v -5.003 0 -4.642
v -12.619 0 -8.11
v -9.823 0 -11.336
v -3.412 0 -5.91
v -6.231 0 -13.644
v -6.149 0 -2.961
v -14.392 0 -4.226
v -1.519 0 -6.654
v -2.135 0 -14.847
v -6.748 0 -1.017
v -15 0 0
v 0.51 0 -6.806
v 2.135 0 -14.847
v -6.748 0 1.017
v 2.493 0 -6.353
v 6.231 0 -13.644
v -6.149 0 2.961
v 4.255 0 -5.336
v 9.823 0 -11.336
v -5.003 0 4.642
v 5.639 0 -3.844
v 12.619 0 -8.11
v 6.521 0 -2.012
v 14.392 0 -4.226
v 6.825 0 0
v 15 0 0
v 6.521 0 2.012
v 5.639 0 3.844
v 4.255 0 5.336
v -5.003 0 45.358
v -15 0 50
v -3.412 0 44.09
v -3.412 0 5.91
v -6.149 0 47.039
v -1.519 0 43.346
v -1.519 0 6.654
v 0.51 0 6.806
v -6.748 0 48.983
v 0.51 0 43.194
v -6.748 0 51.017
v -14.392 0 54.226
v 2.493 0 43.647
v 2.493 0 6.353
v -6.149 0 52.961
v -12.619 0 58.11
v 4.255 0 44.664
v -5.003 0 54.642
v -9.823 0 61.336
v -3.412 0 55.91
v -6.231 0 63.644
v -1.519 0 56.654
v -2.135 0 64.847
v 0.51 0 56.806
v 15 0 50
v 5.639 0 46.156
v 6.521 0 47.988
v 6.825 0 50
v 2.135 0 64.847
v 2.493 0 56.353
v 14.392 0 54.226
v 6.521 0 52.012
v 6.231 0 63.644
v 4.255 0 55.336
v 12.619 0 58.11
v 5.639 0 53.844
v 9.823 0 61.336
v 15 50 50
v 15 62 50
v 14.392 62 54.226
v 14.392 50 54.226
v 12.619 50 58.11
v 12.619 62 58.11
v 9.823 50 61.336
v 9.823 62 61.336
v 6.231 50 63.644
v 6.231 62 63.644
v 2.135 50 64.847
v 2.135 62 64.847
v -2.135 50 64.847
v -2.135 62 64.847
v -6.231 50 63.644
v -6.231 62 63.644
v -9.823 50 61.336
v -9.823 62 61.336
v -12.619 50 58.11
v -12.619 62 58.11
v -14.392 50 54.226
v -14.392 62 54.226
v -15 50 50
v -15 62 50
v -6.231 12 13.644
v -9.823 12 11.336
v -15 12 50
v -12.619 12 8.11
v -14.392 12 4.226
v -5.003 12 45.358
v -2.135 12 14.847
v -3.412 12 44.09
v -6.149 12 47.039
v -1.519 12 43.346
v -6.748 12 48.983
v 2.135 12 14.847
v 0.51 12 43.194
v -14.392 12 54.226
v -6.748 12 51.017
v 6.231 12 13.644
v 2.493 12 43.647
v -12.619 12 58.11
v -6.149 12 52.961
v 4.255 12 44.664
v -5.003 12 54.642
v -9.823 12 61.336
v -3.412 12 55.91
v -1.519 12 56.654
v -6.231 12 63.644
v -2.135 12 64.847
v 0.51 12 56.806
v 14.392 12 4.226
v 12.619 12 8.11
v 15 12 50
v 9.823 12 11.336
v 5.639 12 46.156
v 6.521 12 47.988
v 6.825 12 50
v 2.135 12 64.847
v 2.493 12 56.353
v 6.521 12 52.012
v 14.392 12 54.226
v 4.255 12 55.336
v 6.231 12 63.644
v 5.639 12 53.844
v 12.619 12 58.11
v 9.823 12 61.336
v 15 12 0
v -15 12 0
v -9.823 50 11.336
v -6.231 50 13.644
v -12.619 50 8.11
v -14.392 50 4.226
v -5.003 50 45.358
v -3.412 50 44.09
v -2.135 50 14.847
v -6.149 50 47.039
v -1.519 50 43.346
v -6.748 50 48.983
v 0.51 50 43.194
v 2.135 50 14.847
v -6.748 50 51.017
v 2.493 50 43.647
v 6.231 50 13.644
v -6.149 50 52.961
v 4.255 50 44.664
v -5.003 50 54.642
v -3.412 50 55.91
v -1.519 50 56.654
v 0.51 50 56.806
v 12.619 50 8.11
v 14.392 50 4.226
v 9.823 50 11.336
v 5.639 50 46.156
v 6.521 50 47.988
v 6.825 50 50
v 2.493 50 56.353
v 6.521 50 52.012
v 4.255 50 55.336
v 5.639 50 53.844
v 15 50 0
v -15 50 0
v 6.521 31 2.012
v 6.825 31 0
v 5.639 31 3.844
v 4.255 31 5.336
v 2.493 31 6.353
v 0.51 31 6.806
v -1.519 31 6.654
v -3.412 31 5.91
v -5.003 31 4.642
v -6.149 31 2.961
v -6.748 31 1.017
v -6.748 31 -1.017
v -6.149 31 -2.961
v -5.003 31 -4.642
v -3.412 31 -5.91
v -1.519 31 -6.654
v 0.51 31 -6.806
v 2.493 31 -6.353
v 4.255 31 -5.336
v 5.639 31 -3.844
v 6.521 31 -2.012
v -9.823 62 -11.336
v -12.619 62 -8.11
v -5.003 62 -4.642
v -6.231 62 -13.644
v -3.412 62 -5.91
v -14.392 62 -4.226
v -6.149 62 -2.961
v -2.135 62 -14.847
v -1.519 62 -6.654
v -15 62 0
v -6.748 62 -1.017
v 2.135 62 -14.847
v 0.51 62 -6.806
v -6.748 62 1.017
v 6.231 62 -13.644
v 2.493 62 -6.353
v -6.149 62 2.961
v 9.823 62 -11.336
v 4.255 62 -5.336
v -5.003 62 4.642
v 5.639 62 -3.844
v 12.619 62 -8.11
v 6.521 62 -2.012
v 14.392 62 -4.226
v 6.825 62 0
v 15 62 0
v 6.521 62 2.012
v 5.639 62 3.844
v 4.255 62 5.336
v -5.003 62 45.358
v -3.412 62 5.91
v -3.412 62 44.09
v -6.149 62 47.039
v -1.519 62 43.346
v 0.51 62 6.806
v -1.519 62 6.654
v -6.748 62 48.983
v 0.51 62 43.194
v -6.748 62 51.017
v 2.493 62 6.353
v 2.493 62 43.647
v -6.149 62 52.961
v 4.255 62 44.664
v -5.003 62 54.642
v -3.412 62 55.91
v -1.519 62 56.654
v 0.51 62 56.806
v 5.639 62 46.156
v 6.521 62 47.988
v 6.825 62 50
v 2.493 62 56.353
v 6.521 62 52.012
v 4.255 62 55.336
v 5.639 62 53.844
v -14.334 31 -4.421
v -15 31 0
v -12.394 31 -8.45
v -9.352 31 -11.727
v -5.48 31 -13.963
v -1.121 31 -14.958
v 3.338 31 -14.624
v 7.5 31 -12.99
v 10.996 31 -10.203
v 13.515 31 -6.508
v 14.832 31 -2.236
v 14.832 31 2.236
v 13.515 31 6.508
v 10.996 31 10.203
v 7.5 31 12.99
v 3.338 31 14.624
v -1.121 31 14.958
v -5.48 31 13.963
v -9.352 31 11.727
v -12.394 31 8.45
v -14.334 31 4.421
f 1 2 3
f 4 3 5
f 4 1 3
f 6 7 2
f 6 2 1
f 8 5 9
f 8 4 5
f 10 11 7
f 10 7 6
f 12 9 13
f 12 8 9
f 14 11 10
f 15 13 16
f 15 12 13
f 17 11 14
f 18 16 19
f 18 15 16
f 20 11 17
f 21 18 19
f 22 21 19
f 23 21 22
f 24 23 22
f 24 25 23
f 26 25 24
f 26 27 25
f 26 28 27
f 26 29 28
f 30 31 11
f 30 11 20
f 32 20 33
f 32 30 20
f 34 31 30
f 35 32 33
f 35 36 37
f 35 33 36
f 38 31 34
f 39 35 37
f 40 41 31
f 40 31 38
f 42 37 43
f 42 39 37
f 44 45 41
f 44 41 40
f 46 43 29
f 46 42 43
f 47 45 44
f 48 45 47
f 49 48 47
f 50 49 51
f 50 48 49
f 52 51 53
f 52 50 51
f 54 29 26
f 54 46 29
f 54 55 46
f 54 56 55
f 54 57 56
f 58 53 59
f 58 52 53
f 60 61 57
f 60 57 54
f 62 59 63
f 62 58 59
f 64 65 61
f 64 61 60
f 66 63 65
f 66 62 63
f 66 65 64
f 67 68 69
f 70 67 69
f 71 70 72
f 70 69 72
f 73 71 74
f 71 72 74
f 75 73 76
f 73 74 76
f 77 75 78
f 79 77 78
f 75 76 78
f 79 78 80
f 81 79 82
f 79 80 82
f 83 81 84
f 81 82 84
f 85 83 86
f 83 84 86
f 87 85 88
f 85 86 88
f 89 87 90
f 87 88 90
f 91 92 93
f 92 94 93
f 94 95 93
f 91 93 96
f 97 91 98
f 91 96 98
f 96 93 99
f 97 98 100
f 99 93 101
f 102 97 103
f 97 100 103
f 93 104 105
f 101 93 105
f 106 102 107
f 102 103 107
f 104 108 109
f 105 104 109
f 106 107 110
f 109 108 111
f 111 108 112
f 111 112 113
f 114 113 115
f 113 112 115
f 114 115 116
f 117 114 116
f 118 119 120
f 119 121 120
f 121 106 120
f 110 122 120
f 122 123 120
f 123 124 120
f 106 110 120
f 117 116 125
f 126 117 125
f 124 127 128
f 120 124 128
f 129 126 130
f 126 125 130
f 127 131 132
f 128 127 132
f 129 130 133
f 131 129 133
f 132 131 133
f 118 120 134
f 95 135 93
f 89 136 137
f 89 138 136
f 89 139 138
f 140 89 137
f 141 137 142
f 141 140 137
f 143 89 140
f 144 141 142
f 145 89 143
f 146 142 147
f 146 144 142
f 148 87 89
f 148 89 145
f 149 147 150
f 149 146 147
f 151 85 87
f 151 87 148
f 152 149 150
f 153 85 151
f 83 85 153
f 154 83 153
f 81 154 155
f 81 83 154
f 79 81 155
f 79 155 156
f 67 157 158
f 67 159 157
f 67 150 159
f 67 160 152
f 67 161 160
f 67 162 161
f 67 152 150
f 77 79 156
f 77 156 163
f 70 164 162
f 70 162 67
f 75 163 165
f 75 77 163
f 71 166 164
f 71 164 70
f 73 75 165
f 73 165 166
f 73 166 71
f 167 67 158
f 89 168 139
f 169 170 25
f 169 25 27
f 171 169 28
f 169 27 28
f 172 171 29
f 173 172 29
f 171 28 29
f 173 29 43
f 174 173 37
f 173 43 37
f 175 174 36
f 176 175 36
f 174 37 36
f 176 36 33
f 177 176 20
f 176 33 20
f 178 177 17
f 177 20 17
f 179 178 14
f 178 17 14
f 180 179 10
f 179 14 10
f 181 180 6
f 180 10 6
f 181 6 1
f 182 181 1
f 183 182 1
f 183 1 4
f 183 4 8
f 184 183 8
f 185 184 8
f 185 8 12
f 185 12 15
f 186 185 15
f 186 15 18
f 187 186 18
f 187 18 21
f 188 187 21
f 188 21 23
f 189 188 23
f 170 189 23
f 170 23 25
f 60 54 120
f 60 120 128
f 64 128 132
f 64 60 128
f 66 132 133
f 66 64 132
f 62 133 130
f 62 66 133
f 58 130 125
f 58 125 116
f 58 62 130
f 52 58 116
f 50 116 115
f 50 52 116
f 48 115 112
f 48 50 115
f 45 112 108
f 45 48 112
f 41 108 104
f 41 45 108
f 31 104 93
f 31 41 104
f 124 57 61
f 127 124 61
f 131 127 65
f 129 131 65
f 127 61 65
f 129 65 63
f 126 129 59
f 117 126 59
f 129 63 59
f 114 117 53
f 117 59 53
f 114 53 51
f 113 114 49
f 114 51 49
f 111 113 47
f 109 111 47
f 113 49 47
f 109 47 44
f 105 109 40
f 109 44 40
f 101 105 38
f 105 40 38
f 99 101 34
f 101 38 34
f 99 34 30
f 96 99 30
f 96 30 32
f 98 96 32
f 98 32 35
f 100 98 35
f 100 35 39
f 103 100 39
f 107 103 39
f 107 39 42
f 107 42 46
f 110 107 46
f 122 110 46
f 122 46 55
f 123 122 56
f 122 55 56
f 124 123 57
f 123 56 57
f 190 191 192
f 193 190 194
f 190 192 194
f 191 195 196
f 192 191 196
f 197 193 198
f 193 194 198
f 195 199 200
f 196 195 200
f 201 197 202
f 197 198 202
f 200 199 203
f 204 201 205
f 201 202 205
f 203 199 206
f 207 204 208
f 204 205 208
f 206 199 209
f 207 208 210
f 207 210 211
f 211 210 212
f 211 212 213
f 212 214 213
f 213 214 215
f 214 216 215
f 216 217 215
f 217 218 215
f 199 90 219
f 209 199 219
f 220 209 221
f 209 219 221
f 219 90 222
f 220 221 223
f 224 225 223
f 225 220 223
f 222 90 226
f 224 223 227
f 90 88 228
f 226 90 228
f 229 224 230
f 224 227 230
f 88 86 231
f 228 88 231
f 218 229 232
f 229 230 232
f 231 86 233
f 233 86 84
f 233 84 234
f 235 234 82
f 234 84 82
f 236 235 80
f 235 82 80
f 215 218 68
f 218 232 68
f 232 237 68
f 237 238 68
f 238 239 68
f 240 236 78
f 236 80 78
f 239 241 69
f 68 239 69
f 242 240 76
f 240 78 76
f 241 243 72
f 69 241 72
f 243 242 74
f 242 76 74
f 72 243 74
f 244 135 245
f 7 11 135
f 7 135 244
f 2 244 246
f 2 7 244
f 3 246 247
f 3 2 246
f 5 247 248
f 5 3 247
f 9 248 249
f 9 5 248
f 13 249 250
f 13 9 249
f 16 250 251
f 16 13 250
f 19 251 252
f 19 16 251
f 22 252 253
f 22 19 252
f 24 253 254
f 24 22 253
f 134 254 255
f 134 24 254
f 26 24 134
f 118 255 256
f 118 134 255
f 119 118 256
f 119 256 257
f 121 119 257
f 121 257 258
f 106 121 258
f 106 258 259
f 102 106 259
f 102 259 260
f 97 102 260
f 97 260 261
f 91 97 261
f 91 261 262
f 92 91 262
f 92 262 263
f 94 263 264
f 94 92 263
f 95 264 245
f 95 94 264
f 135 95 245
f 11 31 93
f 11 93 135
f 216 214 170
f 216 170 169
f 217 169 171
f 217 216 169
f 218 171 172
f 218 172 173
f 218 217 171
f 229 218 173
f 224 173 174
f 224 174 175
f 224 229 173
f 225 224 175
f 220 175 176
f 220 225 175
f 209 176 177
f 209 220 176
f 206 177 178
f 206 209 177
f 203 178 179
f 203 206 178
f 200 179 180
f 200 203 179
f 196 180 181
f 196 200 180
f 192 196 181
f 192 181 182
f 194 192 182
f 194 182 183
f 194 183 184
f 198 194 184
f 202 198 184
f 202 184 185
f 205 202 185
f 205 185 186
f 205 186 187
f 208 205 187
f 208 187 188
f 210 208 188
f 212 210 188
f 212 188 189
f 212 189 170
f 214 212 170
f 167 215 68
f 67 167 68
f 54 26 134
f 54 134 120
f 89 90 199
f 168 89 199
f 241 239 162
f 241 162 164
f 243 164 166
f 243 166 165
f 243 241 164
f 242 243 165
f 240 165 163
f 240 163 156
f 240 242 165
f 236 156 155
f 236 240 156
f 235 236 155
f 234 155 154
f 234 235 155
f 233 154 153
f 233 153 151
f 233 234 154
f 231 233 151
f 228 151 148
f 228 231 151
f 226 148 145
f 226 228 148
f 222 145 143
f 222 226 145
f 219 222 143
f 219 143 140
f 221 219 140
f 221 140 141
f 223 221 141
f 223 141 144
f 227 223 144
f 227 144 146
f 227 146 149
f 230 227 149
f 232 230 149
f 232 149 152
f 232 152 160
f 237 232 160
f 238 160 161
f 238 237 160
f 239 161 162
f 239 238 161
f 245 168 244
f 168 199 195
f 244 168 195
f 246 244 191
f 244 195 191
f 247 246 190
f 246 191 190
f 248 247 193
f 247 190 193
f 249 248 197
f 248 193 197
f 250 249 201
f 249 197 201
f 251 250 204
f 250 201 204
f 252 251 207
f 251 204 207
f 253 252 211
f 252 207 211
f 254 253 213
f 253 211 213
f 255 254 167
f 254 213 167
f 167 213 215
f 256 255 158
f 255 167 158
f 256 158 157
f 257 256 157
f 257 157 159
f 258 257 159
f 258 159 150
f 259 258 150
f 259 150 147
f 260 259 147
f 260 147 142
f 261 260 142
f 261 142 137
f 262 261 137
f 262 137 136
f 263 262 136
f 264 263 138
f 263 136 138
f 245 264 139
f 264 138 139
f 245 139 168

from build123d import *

# Parameters (mm, degrees)
F0_R     = 6.824609
F1_DEPTH = 12
F2_DEPTH = 31


with BuildPart() as f1:
    # F0 (on Front) → F1 (new body)
    with BuildSketch(Plane.XZ):
        with BuildLine():
            ThreePointArc((15, 50), (0, 65), (-15, 50))
            Line((-15, 50), (-15, 0))
            ThreePointArc((-15, 0), (0, 15), (15, 0))
            Line((15, 0), (15, 50))
        make_face()
        with Locations((0, 50)):
            Circle(F0_R, mode=Mode.SUBTRACT)
        with BuildLine():
            ThreePointArc((15, 0), (0, 15), (-15, 0))
            ThreePointArc((-15, 0), (0, -15), (15, 0))
        make_face()
        Circle(F0_R, mode=Mode.SUBTRACT)
    extrude(amount=-F1_DEPTH)

    # F0 (on Front) → F2 (join)
    with BuildSketch(Plane.XZ):
        with BuildLine():
            ThreePointArc((15, 0), (0, 15), (-15, 0))
            ThreePointArc((-15, 0), (0, -15), (15, 0))
        make_face()
        Circle(F0_R, mode=Mode.SUBTRACT)
    extrude(amount=-F2_DEPTH)

    # F3: F1 across face


with BuildPart() as f1_1:
    add(f1.part)
    add(f1.part.mirror(Plane(origin=(0, 31, 0), x_dir=(1, 0, 0), z_dir=(0, 1, 0))))


solid = f1_1.part
